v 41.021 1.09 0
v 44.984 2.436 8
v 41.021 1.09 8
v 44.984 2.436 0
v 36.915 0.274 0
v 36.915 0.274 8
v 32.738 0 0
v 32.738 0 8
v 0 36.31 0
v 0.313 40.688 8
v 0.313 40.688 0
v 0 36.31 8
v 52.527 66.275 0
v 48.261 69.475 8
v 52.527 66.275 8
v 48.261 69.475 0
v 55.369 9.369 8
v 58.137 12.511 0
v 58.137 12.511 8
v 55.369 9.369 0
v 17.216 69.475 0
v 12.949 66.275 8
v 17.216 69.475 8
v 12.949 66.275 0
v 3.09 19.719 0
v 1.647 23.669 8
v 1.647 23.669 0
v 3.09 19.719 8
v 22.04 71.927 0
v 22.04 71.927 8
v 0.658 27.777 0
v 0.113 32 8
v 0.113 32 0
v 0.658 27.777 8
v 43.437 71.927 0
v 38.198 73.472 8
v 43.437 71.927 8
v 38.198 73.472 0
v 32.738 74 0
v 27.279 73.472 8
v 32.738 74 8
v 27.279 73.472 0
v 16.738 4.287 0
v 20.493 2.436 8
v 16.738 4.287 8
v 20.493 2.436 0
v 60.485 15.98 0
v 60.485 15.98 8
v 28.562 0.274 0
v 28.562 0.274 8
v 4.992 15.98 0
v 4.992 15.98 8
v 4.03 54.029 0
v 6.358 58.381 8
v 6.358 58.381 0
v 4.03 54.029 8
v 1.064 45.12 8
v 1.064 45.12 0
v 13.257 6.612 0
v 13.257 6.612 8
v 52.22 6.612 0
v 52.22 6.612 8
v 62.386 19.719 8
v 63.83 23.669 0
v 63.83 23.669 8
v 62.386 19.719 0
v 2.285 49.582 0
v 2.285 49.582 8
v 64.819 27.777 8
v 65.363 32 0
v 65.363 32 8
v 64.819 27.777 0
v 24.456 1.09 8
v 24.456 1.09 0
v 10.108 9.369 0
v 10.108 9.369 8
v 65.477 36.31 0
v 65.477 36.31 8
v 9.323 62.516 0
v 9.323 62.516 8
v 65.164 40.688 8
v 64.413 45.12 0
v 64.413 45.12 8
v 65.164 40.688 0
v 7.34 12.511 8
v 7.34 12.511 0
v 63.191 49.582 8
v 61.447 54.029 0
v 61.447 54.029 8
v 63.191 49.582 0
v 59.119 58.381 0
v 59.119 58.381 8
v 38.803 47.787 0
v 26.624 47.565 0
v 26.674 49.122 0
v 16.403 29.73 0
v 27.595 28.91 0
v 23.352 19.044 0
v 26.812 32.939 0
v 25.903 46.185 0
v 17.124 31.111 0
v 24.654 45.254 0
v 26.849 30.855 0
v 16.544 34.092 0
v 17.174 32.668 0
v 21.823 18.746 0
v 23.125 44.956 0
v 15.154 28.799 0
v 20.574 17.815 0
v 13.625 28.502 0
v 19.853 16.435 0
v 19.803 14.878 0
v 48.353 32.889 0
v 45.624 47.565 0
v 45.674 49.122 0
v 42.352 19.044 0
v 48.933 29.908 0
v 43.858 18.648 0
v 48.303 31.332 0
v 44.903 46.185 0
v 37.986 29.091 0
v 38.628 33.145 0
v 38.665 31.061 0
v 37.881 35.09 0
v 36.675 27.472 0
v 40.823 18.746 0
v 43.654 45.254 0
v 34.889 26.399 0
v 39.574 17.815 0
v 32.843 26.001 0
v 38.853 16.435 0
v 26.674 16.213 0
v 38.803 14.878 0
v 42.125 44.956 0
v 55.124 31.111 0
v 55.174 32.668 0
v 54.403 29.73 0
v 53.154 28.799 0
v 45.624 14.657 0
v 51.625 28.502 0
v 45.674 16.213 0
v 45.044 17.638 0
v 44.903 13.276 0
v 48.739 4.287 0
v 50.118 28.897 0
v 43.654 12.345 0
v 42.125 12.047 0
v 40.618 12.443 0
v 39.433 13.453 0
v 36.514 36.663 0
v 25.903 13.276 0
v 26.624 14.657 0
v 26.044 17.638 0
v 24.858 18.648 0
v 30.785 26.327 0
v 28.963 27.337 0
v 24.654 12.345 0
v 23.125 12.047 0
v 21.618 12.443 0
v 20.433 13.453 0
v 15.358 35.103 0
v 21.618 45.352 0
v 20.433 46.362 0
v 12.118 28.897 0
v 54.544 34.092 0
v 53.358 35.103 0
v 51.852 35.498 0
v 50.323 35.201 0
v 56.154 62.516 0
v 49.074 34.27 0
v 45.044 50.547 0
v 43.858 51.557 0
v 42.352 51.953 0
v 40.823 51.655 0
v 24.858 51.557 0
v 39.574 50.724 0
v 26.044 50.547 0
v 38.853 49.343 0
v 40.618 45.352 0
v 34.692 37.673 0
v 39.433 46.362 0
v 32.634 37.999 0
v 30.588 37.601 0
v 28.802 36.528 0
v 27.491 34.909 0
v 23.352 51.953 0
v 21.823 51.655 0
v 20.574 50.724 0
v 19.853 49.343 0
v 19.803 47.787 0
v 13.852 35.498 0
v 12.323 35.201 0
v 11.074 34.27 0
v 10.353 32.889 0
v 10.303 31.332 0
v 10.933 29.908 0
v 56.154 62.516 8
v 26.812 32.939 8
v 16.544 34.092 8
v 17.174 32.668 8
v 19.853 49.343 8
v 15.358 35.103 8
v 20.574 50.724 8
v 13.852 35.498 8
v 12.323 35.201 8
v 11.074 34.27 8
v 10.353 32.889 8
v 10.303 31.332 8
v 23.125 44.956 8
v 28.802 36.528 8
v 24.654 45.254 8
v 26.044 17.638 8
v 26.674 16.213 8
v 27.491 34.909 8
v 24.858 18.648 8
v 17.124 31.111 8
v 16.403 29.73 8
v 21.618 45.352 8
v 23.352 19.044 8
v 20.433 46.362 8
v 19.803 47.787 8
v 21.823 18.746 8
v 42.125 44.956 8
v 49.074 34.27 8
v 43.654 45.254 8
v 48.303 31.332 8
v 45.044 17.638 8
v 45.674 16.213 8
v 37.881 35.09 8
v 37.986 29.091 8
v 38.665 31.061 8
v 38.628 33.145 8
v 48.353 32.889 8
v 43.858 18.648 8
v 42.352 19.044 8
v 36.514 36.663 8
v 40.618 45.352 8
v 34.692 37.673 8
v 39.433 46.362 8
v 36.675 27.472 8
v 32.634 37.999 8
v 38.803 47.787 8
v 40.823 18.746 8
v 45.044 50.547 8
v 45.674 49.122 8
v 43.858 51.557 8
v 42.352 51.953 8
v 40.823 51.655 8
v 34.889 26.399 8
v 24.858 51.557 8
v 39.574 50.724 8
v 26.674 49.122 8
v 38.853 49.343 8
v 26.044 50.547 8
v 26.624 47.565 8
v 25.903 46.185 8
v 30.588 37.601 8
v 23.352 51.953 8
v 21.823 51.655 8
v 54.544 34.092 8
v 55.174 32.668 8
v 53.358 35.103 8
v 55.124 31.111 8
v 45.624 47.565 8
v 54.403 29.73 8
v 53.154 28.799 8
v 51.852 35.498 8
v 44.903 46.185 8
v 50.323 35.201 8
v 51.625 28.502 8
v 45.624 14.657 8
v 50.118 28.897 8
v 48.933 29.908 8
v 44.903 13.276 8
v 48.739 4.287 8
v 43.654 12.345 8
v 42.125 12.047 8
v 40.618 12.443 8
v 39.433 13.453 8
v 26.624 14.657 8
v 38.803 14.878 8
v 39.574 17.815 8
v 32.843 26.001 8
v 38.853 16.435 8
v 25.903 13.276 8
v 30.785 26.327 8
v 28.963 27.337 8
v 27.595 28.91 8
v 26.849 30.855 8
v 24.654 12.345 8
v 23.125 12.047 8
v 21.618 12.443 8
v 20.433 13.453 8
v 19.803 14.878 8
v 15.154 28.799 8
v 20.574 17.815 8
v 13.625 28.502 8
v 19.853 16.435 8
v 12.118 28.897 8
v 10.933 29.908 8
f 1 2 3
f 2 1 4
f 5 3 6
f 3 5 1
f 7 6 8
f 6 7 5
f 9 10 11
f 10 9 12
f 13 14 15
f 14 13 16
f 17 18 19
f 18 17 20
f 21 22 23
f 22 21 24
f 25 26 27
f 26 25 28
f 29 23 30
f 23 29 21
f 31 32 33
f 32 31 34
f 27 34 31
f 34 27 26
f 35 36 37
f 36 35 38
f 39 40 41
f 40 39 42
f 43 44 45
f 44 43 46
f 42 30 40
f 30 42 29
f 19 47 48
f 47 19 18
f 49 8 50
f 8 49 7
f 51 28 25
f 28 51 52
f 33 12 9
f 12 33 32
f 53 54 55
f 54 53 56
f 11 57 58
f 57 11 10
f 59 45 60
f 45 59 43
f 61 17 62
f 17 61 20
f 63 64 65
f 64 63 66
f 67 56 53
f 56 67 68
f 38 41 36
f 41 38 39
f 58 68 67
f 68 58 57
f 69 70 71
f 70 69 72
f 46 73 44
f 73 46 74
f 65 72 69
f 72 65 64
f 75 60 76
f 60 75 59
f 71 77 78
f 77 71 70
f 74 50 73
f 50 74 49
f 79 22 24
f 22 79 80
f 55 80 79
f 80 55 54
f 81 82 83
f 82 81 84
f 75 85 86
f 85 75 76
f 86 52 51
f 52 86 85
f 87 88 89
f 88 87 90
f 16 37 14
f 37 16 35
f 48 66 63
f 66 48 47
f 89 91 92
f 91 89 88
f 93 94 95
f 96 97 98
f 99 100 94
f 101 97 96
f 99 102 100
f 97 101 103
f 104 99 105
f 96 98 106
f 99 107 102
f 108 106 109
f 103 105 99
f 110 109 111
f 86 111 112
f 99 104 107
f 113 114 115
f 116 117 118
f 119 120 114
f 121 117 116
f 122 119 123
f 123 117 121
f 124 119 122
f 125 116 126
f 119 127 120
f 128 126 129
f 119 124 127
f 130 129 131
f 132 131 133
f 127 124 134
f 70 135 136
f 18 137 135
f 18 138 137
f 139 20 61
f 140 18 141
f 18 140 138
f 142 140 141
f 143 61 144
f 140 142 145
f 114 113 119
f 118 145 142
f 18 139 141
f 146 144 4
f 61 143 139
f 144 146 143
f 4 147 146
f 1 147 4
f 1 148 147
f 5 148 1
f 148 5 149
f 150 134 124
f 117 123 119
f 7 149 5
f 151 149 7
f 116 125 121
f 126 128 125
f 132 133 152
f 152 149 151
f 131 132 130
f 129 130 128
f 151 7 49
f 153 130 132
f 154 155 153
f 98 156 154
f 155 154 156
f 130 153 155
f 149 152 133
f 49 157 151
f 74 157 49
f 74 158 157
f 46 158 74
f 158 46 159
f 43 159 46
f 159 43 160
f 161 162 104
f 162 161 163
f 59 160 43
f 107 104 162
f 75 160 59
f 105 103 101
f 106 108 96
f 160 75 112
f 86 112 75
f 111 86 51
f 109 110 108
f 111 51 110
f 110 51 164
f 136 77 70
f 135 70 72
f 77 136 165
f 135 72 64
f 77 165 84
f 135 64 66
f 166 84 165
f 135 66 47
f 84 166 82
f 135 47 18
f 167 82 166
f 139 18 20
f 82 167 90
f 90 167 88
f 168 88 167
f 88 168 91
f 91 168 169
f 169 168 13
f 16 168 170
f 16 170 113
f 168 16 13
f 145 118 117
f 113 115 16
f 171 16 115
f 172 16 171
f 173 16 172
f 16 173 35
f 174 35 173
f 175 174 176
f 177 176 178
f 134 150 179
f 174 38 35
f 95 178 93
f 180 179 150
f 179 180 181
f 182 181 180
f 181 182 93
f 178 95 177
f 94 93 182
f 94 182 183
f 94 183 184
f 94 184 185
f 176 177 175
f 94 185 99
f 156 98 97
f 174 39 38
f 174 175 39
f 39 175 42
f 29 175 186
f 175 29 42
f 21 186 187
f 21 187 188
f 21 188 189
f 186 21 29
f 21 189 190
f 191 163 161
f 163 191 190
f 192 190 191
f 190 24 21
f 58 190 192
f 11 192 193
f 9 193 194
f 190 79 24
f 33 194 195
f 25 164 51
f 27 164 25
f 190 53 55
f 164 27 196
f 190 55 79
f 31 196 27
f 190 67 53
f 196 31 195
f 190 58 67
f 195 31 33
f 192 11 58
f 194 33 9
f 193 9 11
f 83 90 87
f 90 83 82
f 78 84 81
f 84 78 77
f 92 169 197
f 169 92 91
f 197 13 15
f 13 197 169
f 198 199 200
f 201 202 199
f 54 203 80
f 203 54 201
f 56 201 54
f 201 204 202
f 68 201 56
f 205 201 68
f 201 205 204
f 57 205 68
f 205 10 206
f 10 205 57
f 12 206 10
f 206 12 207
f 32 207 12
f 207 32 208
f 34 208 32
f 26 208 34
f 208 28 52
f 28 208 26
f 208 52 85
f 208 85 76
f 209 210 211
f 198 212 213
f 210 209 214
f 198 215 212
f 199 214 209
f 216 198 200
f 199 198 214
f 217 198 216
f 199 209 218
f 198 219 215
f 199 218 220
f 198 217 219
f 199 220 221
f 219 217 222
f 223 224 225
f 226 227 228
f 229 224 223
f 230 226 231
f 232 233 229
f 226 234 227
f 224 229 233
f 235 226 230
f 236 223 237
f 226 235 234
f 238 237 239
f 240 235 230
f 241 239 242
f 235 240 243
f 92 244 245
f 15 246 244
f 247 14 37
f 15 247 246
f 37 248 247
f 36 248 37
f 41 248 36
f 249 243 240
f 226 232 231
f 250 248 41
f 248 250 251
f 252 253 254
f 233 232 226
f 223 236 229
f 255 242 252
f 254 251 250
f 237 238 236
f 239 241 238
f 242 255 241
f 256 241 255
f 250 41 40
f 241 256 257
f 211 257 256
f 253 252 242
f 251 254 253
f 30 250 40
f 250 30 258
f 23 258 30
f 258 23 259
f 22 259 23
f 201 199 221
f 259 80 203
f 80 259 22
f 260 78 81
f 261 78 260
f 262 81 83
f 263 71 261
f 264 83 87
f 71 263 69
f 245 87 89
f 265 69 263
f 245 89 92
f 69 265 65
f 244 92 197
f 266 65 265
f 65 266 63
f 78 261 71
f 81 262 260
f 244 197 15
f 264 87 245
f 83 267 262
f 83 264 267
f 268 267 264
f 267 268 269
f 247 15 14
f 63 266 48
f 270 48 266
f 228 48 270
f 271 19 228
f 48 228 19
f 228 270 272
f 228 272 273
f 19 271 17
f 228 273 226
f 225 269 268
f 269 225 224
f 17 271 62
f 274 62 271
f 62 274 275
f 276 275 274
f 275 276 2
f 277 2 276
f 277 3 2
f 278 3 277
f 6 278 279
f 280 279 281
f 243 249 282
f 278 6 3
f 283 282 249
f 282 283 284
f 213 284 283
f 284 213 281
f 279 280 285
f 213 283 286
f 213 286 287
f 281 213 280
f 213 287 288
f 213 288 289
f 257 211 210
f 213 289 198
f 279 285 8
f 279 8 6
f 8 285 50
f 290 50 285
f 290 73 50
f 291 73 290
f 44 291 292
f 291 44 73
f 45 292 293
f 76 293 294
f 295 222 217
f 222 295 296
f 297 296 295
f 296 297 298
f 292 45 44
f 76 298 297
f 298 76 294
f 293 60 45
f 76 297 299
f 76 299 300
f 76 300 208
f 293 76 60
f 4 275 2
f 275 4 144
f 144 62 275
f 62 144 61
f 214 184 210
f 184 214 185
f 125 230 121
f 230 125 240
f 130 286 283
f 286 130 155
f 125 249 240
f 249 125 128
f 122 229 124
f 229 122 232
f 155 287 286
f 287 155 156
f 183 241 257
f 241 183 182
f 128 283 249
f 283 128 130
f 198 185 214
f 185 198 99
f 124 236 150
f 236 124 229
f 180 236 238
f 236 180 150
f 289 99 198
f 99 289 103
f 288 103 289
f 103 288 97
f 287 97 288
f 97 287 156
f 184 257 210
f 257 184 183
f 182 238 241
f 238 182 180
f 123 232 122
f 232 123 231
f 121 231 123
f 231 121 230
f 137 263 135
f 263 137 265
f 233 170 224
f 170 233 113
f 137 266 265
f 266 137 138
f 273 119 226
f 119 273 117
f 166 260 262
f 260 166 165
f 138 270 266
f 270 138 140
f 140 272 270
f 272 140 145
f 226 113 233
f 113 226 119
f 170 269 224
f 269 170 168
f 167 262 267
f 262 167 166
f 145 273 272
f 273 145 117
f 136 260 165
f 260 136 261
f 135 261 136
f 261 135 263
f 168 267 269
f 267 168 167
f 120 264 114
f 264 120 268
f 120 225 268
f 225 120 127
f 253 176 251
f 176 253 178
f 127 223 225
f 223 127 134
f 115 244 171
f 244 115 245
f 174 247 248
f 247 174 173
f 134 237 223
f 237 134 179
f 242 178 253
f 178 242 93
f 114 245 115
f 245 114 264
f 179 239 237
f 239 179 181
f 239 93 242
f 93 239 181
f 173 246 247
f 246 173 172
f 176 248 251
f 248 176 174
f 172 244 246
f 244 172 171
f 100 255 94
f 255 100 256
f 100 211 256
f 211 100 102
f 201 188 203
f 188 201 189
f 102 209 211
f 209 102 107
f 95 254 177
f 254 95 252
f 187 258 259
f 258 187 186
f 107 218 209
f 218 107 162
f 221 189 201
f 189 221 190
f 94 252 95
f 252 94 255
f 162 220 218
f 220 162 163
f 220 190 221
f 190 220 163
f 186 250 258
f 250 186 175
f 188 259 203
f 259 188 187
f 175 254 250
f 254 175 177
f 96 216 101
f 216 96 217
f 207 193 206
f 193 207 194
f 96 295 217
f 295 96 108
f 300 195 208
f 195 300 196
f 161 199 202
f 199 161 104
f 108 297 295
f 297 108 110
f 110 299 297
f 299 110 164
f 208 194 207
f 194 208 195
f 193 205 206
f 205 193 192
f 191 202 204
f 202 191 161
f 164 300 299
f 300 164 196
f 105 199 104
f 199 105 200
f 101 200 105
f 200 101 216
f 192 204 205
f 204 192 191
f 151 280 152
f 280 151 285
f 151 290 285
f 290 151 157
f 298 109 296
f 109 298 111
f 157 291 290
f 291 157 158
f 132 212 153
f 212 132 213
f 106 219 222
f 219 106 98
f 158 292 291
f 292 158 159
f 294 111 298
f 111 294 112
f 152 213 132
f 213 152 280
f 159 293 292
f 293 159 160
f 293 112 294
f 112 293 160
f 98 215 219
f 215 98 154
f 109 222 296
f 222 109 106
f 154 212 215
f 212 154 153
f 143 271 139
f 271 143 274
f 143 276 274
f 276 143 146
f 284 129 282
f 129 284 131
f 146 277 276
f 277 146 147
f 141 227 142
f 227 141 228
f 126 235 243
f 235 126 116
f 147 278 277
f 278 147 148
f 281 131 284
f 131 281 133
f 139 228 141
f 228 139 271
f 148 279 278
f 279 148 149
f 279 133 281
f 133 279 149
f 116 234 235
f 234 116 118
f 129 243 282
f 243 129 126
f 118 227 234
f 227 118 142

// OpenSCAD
$fn = 32;

// ----------------------------------------------------------------------
// Cam plate: single_lobe cam, base R32
// ----------------------------------------------------------------------

// --- parameters (mm) ---
base_r = 32;              // base circle radius
lobe_h = 10;              // cam lobe rise
bore_r = 6;               // shaft bore radius
plate_t = 8;              // plate thickness, Z (extrusion height)
ring_r = 19;              // lightening ring radius
bolt_r = 3.5;             // lightening hole radius

profile = [[65.363, 32], [65.477, 36.31], [65.164, 40.688], [64.413, 45.12], [63.191, 49.582], [61.447, 54.029], [59.119, 58.381], [56.154, 62.516], [52.527, 66.275], [48.261, 69.475], [43.437, 71.927], [38.198, 73.472], [32.738, 74], [27.279, 73.472], [22.04, 71.927], [17.216, 69.475], [12.949, 66.275], [9.323, 62.516], [6.358, 58.381], [4.03, 54.029], [2.285, 49.582], [1.064, 45.12], [0.313, 40.688], [0, 36.31], [0.113, 32], [0.658, 27.777], [1.647, 23.669], [3.09, 19.719], [4.992, 15.98], [7.34, 12.511], [10.108, 9.369], [13.257, 6.612], [16.738, 4.287], [20.493, 2.436], [24.456, 1.09], [28.562, 0.274], [32.738, 0], [36.915, 0.274], [41.021, 1.09], [44.984, 2.436], [48.739, 4.287], [52.22, 6.612], [55.369, 9.369], [58.137, 12.511], [60.485, 15.98], [62.386, 19.719], [63.83, 23.669], [64.819, 27.777]];  // primary outline, 48 points, counter clockwise
void_1 = [[38.628, 33.145], [37.881, 35.09], [36.514, 36.663], [34.692, 37.673], [32.634, 37.999], [30.588, 37.601], [28.802, 36.528], [27.491, 34.909], [26.812, 32.939], [26.849, 30.855], [27.595, 28.91], [28.963, 27.337], [30.785, 26.327], [32.843, 26.001], [34.889, 26.399], [36.675, 27.472], [37.986, 29.091], [38.665, 31.061]];  // shaft bore, 18 points
void_2 = [[55.174, 32.668], [54.544, 34.092], [53.358, 35.103], [51.852, 35.498], [50.323, 35.201], [49.074, 34.27], [48.353, 32.889], [48.303, 31.332], [48.933, 29.908], [50.118, 28.897], [51.625, 28.502], [53.154, 28.799], [54.403, 29.73], [55.124, 31.111]];  // lightening hole 1, 14 points
void_3 = [[45.674, 49.122], [45.044, 50.547], [43.858, 51.557], [42.352, 51.953], [40.823, 51.655], [39.574, 50.724], [38.853, 49.343], [38.803, 47.787], [39.433, 46.362], [40.618, 45.352], [42.125, 44.956], [43.654, 45.254], [44.903, 46.185], [45.624, 47.565]];  // lightening hole 2, 14 points
void_4 = [[26.674, 49.122], [26.044, 50.547], [24.858, 51.557], [23.352, 51.953], [21.823, 51.655], [20.574, 50.724], [19.853, 49.343], [19.803, 47.787], [20.433, 46.362], [21.618, 45.352], [23.125, 44.956], [24.654, 45.254], [25.903, 46.185], [26.624, 47.565]];  // lightening hole 3, 14 points
void_5 = [[17.174, 32.668], [16.544, 34.092], [15.358, 35.103], [13.852, 35.498], [12.323, 35.201], [11.074, 34.27], [10.353, 32.889], [10.303, 31.332], [10.933, 29.908], [12.118, 28.897], [13.625, 28.502], [15.154, 28.799], [16.403, 29.73], [17.124, 31.111]];  // lightening hole 4, 14 points
void_6 = [[26.674, 16.213], [26.044, 17.638], [24.858, 18.648], [23.352, 19.044], [21.823, 18.746], [20.574, 17.815], [19.853, 16.435], [19.803, 14.878], [20.433, 13.453], [21.618, 12.443], [23.125, 12.047], [24.654, 12.345], [25.903, 13.276], [26.624, 14.657]];  // lightening hole 5, 14 points
void_7 = [[45.674, 16.213], [45.044, 17.638], [43.858, 18.648], [42.352, 19.044], [40.823, 18.746], [39.574, 17.815], [38.853, 16.435], [38.803, 14.878], [39.433, 13.453], [40.618, 12.443], [42.125, 12.047], [43.654, 12.345], [44.903, 13.276], [45.624, 14.657]];  // lightening hole 6, 14 points

// --- the one profile operation ---
difference() {
  linear_extrude(height = plate_t) polygon(points = profile);
  translate([0, 0, -1])
    linear_extrude(height = plate_t + 2) polygon(points = void_1);
  translate([0, 0, -1])
    linear_extrude(height = plate_t + 2) polygon(points = void_2);
  translate([0, 0, -1])
    linear_extrude(height = plate_t + 2) polygon(points = void_3);
  translate([0, 0, -1])
    linear_extrude(height = plate_t + 2) polygon(points = void_4);
  translate([0, 0, -1])
    linear_extrude(height = plate_t + 2) polygon(points = void_5);
  translate([0, 0, -1])
    linear_extrude(height = plate_t + 2) polygon(points = void_6);
  translate([0, 0, -1])
    linear_extrude(height = plate_t + 2) polygon(points = void_7);
}
